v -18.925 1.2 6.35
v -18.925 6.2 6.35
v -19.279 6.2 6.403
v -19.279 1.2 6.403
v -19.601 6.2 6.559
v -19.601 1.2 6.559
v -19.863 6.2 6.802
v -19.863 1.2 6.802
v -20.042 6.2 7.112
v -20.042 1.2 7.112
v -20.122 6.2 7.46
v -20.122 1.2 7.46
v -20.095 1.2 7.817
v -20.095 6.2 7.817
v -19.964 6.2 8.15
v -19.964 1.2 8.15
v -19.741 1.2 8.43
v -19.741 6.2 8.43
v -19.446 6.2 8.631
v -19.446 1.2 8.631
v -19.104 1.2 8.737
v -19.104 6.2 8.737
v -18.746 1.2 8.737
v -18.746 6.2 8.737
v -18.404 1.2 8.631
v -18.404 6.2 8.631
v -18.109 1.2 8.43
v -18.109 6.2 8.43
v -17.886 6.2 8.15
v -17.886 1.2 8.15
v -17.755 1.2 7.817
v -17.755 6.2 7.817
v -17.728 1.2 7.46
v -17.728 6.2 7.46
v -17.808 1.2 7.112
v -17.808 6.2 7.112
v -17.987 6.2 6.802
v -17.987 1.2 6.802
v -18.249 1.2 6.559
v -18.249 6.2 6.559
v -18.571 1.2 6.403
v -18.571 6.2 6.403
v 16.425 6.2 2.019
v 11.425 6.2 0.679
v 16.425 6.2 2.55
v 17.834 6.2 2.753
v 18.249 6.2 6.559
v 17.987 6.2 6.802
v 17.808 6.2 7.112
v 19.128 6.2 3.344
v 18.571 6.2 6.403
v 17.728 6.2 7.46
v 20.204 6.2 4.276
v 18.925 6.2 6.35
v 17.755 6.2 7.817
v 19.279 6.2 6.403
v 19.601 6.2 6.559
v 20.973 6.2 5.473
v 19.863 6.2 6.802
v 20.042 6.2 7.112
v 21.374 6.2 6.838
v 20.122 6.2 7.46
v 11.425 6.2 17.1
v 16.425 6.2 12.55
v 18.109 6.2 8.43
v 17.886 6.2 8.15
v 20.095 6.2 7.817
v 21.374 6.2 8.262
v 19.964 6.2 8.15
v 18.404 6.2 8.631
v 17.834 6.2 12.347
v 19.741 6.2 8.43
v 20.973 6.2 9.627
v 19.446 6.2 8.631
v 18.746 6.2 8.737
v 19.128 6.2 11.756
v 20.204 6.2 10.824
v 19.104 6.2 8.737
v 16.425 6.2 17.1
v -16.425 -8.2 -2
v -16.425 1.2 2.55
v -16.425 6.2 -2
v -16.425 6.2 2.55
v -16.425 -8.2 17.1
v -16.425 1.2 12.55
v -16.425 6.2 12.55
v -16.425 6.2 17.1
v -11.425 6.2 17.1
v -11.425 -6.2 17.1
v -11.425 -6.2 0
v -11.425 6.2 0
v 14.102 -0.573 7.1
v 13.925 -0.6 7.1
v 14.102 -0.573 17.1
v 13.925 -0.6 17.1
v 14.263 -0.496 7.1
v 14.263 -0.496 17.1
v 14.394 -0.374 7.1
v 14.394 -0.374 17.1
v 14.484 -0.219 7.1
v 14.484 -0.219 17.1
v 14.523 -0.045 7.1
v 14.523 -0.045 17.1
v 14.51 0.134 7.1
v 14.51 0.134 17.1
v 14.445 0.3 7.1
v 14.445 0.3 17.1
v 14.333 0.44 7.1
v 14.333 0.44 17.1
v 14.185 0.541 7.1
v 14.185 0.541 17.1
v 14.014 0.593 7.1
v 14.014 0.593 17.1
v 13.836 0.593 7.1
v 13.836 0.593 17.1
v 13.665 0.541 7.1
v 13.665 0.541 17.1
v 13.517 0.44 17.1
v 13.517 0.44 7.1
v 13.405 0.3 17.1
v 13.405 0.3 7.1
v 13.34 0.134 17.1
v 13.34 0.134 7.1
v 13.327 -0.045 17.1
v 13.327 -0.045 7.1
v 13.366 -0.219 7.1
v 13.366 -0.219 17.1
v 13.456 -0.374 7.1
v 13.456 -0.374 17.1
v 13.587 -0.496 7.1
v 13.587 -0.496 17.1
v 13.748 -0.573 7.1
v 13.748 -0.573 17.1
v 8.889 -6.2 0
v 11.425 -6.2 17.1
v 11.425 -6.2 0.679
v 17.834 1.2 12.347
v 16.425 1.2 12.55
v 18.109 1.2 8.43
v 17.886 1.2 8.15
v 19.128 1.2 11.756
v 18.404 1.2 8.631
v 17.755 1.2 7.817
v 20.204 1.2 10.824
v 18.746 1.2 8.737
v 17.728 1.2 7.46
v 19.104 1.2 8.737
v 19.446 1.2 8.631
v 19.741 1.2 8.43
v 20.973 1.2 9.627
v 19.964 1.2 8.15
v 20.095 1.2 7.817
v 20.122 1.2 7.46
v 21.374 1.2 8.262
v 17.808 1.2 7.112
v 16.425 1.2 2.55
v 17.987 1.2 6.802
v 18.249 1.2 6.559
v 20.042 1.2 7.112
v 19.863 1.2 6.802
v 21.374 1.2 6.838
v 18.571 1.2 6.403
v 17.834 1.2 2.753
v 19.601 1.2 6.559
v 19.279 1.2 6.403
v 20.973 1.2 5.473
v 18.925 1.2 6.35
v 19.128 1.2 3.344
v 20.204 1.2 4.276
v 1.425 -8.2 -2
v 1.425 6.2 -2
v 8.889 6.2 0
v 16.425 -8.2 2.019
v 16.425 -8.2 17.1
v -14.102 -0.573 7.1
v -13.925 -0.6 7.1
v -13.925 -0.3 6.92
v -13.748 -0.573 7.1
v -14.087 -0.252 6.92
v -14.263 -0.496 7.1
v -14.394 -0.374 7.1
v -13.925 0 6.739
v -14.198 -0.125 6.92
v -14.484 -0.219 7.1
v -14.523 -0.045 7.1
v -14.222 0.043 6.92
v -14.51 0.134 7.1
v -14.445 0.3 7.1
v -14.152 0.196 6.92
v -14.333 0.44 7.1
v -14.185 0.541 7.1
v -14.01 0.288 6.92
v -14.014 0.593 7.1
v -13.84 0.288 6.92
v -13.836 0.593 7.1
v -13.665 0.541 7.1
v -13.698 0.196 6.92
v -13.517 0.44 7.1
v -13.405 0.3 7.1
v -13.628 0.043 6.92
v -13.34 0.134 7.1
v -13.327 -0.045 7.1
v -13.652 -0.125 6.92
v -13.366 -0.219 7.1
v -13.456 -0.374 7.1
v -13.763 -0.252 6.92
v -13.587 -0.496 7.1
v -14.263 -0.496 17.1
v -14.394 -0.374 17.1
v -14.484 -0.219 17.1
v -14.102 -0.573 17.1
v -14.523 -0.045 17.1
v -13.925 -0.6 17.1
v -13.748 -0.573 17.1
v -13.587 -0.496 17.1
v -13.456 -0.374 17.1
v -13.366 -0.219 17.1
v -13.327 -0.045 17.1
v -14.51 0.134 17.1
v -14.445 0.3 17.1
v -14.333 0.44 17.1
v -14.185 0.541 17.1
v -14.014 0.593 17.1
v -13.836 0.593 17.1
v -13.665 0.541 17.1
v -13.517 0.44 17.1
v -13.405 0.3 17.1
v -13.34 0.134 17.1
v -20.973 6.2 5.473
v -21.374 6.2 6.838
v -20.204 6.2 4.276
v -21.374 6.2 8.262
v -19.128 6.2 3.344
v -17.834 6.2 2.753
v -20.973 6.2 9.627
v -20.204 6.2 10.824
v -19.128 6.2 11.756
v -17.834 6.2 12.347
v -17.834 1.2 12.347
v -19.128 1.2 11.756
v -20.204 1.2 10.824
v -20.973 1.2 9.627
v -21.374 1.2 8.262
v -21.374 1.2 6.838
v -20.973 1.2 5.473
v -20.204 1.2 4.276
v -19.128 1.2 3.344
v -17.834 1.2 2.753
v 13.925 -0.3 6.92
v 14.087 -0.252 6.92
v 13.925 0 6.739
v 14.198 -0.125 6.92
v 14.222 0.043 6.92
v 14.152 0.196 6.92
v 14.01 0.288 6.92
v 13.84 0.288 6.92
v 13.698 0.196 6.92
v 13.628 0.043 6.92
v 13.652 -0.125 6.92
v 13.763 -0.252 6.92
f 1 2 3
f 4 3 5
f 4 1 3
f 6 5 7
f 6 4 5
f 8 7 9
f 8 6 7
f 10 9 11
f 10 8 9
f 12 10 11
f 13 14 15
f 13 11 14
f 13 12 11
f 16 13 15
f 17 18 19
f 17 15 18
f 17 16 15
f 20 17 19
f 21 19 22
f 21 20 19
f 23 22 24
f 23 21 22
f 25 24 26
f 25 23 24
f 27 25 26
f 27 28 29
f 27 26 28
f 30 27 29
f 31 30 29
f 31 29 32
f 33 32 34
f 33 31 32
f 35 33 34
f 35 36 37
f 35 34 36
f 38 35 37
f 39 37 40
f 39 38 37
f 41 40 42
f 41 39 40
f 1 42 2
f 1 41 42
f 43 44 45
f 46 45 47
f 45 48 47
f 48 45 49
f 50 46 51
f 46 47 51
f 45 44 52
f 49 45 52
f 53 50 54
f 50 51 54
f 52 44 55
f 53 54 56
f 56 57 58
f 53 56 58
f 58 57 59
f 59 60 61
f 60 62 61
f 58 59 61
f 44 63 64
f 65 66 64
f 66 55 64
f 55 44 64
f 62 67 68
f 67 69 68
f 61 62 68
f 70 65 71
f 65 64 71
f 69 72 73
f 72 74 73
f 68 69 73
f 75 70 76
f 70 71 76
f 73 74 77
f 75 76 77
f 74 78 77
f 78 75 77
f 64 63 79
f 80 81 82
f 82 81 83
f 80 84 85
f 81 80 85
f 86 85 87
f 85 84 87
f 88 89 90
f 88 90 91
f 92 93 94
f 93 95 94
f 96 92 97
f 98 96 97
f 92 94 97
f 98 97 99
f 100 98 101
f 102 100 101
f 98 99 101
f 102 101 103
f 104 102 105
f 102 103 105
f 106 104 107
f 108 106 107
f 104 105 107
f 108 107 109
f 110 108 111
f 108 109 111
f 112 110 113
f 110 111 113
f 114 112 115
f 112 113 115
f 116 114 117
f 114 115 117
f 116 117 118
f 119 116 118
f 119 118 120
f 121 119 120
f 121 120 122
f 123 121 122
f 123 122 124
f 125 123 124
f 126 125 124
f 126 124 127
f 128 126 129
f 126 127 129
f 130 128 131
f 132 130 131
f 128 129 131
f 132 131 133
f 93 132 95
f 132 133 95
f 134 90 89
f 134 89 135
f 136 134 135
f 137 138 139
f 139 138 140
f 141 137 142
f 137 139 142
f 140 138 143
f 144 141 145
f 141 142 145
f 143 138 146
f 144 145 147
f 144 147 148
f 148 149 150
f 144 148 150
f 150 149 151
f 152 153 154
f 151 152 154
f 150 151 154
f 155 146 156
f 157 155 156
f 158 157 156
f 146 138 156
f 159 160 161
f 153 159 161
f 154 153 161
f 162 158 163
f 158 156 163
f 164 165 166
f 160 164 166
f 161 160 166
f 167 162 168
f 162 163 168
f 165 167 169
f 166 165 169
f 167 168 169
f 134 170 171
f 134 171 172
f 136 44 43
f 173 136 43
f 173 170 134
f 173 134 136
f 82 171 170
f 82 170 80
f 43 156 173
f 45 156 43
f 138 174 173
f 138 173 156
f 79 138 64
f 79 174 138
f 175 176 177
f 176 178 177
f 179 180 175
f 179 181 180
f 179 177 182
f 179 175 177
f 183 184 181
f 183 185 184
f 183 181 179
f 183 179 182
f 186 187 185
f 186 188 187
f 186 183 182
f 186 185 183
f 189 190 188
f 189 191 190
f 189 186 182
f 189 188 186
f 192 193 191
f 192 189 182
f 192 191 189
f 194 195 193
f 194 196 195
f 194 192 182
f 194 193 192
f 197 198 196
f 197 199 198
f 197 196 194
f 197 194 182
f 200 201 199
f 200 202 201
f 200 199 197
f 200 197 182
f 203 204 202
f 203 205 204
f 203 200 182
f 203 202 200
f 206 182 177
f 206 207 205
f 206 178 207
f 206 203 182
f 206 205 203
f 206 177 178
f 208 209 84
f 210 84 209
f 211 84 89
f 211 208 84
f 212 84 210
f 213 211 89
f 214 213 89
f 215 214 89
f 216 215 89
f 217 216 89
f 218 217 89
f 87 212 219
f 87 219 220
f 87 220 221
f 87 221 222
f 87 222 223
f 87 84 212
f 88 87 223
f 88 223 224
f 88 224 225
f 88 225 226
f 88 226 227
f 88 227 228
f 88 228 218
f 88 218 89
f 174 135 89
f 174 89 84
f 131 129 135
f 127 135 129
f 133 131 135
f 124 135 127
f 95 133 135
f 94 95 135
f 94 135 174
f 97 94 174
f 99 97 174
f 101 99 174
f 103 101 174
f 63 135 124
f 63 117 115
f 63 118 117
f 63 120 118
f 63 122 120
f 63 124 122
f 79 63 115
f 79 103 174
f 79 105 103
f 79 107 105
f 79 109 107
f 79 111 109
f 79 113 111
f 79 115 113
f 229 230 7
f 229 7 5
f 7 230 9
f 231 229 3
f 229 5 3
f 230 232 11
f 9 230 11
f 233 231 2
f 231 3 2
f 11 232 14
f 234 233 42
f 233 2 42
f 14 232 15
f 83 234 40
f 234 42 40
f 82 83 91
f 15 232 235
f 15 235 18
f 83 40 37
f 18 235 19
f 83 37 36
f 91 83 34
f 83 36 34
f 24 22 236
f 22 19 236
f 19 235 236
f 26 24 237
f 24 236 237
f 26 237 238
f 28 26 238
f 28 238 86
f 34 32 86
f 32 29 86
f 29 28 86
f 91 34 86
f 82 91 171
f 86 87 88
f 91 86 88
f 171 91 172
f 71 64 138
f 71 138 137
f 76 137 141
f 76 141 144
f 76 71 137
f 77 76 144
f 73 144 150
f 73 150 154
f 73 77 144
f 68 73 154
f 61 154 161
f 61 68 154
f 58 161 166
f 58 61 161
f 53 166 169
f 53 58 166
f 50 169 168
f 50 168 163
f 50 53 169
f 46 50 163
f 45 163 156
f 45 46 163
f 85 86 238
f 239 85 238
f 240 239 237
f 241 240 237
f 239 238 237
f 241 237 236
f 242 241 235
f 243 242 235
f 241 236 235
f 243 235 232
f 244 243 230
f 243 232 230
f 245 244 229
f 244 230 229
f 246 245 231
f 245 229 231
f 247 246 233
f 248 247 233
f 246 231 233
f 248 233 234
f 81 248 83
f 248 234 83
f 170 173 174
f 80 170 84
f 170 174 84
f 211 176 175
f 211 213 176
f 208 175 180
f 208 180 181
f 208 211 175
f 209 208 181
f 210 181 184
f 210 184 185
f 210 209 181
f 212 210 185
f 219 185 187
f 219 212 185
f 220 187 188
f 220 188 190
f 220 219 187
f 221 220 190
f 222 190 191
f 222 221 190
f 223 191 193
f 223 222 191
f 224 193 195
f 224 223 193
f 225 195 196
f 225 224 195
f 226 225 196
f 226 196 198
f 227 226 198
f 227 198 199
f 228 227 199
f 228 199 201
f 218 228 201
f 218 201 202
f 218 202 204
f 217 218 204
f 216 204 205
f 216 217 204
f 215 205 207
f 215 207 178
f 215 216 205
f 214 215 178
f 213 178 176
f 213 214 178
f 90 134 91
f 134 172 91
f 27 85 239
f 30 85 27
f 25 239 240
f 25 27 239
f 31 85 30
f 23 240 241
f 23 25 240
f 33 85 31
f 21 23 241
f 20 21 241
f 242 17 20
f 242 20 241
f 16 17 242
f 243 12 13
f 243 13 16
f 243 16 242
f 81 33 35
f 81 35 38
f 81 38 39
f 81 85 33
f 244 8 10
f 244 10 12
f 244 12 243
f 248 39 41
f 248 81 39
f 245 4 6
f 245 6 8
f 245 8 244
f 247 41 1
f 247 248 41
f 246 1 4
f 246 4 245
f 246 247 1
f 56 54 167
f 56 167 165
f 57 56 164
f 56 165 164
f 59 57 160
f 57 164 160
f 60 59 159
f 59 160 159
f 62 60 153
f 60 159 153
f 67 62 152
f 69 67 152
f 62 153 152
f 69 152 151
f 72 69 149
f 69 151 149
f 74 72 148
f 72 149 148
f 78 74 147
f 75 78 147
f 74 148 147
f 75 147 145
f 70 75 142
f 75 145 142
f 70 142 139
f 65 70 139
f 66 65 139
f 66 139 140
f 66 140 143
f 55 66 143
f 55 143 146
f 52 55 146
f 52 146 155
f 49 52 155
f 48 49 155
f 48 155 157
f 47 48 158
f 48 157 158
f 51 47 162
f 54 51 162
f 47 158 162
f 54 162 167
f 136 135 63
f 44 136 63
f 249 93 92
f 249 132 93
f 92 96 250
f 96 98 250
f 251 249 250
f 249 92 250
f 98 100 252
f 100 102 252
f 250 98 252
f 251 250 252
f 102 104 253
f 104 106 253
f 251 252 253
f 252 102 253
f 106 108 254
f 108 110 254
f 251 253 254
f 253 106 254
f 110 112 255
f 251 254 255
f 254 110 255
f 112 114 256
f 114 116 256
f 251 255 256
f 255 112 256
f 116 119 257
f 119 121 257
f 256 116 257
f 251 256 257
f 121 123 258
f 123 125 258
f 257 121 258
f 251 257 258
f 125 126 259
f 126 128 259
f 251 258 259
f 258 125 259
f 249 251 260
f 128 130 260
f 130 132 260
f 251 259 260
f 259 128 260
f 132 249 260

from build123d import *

# Parameters (mm, degrees)
SCHIZZO1_W                   = 32.85
SCHIZZO1_H                   = 16.4
SCHIZZO1_W_2                 = 22.85
SCHIZZO1_H_2                 = 12.4
ESTRUSIONE_ESTRUSIONE1_DEPTH = 17.1
SCHIZZO2_W                   = 32.85
SCHIZZO2_H                   = 16.4
ESTRUSIONE_ESTRUSIONE2_DEPTH = 2
TAGLIO_ESTRUSIONE1_DEPTH     = 29.829683054
TAGLIO_ESTRUSIONE2_REACH     = 28.492
SCHIZZO16_W                  = 32.85
SCHIZZO16_H                  = 2
ESTRUSIONE_ESTRUSIONE3_DEPTH = 5


with BuildPart() as part:
    # Schizzo1 → Estrusione-Estrusione1 (new body)
    with BuildSketch(Plane.XY):
        Rectangle(SCHIZZO1_W, SCHIZZO1_H)
        Rectangle(SCHIZZO1_W_2, SCHIZZO1_H_2, mode=Mode.SUBTRACT)
    extrude(amount=ESTRUSIONE_ESTRUSIONE1_DEPTH)

    # Schizzo2 → Estrusione-Estrusione2 (add)
    with BuildSketch(Plane(origin=(0, 0, 0), x_dir=(-1, 0, 0), z_dir=(0, 0, -1))):
        Rectangle(SCHIZZO2_W, SCHIZZO2_H)
    extrude(amount=ESTRUSIONE_ESTRUSIONE2_DEPTH)

    # Schizzo8 → Foro per Vite M1-1 (revolve, cut)
    with BuildSketch(Plane(origin=(-13.925, 0, 17.1), x_dir=(0, -1, 0), z_dir=(1, 0, 0))):
        Polygon((0, 0), (0, 10.360516371), (0.6, 10), (0.6, 0), align=None)
    foro_per_vite_m1_1 = revolve(axis=Axis((-13.925, 0, 23.45), (0, 0, -1)), mode=Mode.SUBTRACT)

    # Specchia1: Foro per Vite M1-1 across plane
    add(foro_per_vite_m1_1.mirror(Plane(origin=(0, 0, 0), x_dir=(0, 0, 1), z_dir=(1, 0, 0))), mode=Mode.SUBTRACT)

    # Schizzo15 → Taglio-Estrusione1 (cut, through all)
    with BuildSketch(Plane.XZ.offset(8.2)):
        Polygon((16.425, -2), (1.425, -2), (16.425, 2.019237886), align=None)
    extrude(amount=-TAGLIO_ESTRUSIONE1_DEPTH, mode=Mode.SUBTRACT)

    # Schizzo16 → Taglio-Estrusione2 (cut, up to next)
    with BuildSketch(Plane.XY.offset(17.1), mode=Mode.PRIVATE) as taglio_estrusione2_sk1:
        with Locations((0, 7.2)):
            Rectangle(SCHIZZO16_W, SCHIZZO16_H)
    taglio_estrusione2_tool1 = extrude(taglio_estrusione2_sk1.sketch, amount=-TAGLIO_ESTRUSIONE2_REACH, mode=Mode.PRIVATE) & part.part
    add(taglio_estrusione2_tool1.solids().sort_by_distance((0, 7.2, 17.1))[0], mode=Mode.SUBTRACT)

    # Schizzo17 → Estrusione-Estrusione3 (add)
    with BuildSketch(Plane(origin=(0, 6.2, 0), x_dir=(1, 0, 0), z_dir=(0, 1, 0))):
        with BuildLine():
            Line((-16.425, -2.55), (-16.425, -12.55))
            ThreePointArc((-16.425, -12.55), (-21.425, -7.55), (-16.425, -2.55))
        make_face()
    estrusione_estrusione3 = extrude(amount=-ESTRUSIONE_ESTRUSIONE3_DEPTH)

    # Schizzo20 → Foro per Vite M2-1 (revolve, cut)
    with BuildSketch(Plane(origin=(-18.925, 1.2, 7.55), x_dir=(0, 0, -1), z_dir=(1, 0, 0))):
        Polygon((0, 0), (0, 10.721032743), (1.2, 10), (1.2, 0), align=None)
    foro_per_vite_m2_1 = revolve(axis=Axis((-18.925, -5.15, 7.55), (0, 1, 0)), mode=Mode.SUBTRACT)

    # Specchia2: Estrusione-Estrusione3, Foro per Vite M2-1 across plane
    add(estrusione_estrusione3.mirror(Plane(origin=(0, 0, 0), x_dir=(0, 0, 1), z_dir=(1, 0, 0))))
    add(foro_per_vite_m2_1.mirror(Plane(origin=(0, 0, 0), x_dir=(0, 0, 1), z_dir=(1, 0, 0))), mode=Mode.SUBTRACT)


solid = part.part
